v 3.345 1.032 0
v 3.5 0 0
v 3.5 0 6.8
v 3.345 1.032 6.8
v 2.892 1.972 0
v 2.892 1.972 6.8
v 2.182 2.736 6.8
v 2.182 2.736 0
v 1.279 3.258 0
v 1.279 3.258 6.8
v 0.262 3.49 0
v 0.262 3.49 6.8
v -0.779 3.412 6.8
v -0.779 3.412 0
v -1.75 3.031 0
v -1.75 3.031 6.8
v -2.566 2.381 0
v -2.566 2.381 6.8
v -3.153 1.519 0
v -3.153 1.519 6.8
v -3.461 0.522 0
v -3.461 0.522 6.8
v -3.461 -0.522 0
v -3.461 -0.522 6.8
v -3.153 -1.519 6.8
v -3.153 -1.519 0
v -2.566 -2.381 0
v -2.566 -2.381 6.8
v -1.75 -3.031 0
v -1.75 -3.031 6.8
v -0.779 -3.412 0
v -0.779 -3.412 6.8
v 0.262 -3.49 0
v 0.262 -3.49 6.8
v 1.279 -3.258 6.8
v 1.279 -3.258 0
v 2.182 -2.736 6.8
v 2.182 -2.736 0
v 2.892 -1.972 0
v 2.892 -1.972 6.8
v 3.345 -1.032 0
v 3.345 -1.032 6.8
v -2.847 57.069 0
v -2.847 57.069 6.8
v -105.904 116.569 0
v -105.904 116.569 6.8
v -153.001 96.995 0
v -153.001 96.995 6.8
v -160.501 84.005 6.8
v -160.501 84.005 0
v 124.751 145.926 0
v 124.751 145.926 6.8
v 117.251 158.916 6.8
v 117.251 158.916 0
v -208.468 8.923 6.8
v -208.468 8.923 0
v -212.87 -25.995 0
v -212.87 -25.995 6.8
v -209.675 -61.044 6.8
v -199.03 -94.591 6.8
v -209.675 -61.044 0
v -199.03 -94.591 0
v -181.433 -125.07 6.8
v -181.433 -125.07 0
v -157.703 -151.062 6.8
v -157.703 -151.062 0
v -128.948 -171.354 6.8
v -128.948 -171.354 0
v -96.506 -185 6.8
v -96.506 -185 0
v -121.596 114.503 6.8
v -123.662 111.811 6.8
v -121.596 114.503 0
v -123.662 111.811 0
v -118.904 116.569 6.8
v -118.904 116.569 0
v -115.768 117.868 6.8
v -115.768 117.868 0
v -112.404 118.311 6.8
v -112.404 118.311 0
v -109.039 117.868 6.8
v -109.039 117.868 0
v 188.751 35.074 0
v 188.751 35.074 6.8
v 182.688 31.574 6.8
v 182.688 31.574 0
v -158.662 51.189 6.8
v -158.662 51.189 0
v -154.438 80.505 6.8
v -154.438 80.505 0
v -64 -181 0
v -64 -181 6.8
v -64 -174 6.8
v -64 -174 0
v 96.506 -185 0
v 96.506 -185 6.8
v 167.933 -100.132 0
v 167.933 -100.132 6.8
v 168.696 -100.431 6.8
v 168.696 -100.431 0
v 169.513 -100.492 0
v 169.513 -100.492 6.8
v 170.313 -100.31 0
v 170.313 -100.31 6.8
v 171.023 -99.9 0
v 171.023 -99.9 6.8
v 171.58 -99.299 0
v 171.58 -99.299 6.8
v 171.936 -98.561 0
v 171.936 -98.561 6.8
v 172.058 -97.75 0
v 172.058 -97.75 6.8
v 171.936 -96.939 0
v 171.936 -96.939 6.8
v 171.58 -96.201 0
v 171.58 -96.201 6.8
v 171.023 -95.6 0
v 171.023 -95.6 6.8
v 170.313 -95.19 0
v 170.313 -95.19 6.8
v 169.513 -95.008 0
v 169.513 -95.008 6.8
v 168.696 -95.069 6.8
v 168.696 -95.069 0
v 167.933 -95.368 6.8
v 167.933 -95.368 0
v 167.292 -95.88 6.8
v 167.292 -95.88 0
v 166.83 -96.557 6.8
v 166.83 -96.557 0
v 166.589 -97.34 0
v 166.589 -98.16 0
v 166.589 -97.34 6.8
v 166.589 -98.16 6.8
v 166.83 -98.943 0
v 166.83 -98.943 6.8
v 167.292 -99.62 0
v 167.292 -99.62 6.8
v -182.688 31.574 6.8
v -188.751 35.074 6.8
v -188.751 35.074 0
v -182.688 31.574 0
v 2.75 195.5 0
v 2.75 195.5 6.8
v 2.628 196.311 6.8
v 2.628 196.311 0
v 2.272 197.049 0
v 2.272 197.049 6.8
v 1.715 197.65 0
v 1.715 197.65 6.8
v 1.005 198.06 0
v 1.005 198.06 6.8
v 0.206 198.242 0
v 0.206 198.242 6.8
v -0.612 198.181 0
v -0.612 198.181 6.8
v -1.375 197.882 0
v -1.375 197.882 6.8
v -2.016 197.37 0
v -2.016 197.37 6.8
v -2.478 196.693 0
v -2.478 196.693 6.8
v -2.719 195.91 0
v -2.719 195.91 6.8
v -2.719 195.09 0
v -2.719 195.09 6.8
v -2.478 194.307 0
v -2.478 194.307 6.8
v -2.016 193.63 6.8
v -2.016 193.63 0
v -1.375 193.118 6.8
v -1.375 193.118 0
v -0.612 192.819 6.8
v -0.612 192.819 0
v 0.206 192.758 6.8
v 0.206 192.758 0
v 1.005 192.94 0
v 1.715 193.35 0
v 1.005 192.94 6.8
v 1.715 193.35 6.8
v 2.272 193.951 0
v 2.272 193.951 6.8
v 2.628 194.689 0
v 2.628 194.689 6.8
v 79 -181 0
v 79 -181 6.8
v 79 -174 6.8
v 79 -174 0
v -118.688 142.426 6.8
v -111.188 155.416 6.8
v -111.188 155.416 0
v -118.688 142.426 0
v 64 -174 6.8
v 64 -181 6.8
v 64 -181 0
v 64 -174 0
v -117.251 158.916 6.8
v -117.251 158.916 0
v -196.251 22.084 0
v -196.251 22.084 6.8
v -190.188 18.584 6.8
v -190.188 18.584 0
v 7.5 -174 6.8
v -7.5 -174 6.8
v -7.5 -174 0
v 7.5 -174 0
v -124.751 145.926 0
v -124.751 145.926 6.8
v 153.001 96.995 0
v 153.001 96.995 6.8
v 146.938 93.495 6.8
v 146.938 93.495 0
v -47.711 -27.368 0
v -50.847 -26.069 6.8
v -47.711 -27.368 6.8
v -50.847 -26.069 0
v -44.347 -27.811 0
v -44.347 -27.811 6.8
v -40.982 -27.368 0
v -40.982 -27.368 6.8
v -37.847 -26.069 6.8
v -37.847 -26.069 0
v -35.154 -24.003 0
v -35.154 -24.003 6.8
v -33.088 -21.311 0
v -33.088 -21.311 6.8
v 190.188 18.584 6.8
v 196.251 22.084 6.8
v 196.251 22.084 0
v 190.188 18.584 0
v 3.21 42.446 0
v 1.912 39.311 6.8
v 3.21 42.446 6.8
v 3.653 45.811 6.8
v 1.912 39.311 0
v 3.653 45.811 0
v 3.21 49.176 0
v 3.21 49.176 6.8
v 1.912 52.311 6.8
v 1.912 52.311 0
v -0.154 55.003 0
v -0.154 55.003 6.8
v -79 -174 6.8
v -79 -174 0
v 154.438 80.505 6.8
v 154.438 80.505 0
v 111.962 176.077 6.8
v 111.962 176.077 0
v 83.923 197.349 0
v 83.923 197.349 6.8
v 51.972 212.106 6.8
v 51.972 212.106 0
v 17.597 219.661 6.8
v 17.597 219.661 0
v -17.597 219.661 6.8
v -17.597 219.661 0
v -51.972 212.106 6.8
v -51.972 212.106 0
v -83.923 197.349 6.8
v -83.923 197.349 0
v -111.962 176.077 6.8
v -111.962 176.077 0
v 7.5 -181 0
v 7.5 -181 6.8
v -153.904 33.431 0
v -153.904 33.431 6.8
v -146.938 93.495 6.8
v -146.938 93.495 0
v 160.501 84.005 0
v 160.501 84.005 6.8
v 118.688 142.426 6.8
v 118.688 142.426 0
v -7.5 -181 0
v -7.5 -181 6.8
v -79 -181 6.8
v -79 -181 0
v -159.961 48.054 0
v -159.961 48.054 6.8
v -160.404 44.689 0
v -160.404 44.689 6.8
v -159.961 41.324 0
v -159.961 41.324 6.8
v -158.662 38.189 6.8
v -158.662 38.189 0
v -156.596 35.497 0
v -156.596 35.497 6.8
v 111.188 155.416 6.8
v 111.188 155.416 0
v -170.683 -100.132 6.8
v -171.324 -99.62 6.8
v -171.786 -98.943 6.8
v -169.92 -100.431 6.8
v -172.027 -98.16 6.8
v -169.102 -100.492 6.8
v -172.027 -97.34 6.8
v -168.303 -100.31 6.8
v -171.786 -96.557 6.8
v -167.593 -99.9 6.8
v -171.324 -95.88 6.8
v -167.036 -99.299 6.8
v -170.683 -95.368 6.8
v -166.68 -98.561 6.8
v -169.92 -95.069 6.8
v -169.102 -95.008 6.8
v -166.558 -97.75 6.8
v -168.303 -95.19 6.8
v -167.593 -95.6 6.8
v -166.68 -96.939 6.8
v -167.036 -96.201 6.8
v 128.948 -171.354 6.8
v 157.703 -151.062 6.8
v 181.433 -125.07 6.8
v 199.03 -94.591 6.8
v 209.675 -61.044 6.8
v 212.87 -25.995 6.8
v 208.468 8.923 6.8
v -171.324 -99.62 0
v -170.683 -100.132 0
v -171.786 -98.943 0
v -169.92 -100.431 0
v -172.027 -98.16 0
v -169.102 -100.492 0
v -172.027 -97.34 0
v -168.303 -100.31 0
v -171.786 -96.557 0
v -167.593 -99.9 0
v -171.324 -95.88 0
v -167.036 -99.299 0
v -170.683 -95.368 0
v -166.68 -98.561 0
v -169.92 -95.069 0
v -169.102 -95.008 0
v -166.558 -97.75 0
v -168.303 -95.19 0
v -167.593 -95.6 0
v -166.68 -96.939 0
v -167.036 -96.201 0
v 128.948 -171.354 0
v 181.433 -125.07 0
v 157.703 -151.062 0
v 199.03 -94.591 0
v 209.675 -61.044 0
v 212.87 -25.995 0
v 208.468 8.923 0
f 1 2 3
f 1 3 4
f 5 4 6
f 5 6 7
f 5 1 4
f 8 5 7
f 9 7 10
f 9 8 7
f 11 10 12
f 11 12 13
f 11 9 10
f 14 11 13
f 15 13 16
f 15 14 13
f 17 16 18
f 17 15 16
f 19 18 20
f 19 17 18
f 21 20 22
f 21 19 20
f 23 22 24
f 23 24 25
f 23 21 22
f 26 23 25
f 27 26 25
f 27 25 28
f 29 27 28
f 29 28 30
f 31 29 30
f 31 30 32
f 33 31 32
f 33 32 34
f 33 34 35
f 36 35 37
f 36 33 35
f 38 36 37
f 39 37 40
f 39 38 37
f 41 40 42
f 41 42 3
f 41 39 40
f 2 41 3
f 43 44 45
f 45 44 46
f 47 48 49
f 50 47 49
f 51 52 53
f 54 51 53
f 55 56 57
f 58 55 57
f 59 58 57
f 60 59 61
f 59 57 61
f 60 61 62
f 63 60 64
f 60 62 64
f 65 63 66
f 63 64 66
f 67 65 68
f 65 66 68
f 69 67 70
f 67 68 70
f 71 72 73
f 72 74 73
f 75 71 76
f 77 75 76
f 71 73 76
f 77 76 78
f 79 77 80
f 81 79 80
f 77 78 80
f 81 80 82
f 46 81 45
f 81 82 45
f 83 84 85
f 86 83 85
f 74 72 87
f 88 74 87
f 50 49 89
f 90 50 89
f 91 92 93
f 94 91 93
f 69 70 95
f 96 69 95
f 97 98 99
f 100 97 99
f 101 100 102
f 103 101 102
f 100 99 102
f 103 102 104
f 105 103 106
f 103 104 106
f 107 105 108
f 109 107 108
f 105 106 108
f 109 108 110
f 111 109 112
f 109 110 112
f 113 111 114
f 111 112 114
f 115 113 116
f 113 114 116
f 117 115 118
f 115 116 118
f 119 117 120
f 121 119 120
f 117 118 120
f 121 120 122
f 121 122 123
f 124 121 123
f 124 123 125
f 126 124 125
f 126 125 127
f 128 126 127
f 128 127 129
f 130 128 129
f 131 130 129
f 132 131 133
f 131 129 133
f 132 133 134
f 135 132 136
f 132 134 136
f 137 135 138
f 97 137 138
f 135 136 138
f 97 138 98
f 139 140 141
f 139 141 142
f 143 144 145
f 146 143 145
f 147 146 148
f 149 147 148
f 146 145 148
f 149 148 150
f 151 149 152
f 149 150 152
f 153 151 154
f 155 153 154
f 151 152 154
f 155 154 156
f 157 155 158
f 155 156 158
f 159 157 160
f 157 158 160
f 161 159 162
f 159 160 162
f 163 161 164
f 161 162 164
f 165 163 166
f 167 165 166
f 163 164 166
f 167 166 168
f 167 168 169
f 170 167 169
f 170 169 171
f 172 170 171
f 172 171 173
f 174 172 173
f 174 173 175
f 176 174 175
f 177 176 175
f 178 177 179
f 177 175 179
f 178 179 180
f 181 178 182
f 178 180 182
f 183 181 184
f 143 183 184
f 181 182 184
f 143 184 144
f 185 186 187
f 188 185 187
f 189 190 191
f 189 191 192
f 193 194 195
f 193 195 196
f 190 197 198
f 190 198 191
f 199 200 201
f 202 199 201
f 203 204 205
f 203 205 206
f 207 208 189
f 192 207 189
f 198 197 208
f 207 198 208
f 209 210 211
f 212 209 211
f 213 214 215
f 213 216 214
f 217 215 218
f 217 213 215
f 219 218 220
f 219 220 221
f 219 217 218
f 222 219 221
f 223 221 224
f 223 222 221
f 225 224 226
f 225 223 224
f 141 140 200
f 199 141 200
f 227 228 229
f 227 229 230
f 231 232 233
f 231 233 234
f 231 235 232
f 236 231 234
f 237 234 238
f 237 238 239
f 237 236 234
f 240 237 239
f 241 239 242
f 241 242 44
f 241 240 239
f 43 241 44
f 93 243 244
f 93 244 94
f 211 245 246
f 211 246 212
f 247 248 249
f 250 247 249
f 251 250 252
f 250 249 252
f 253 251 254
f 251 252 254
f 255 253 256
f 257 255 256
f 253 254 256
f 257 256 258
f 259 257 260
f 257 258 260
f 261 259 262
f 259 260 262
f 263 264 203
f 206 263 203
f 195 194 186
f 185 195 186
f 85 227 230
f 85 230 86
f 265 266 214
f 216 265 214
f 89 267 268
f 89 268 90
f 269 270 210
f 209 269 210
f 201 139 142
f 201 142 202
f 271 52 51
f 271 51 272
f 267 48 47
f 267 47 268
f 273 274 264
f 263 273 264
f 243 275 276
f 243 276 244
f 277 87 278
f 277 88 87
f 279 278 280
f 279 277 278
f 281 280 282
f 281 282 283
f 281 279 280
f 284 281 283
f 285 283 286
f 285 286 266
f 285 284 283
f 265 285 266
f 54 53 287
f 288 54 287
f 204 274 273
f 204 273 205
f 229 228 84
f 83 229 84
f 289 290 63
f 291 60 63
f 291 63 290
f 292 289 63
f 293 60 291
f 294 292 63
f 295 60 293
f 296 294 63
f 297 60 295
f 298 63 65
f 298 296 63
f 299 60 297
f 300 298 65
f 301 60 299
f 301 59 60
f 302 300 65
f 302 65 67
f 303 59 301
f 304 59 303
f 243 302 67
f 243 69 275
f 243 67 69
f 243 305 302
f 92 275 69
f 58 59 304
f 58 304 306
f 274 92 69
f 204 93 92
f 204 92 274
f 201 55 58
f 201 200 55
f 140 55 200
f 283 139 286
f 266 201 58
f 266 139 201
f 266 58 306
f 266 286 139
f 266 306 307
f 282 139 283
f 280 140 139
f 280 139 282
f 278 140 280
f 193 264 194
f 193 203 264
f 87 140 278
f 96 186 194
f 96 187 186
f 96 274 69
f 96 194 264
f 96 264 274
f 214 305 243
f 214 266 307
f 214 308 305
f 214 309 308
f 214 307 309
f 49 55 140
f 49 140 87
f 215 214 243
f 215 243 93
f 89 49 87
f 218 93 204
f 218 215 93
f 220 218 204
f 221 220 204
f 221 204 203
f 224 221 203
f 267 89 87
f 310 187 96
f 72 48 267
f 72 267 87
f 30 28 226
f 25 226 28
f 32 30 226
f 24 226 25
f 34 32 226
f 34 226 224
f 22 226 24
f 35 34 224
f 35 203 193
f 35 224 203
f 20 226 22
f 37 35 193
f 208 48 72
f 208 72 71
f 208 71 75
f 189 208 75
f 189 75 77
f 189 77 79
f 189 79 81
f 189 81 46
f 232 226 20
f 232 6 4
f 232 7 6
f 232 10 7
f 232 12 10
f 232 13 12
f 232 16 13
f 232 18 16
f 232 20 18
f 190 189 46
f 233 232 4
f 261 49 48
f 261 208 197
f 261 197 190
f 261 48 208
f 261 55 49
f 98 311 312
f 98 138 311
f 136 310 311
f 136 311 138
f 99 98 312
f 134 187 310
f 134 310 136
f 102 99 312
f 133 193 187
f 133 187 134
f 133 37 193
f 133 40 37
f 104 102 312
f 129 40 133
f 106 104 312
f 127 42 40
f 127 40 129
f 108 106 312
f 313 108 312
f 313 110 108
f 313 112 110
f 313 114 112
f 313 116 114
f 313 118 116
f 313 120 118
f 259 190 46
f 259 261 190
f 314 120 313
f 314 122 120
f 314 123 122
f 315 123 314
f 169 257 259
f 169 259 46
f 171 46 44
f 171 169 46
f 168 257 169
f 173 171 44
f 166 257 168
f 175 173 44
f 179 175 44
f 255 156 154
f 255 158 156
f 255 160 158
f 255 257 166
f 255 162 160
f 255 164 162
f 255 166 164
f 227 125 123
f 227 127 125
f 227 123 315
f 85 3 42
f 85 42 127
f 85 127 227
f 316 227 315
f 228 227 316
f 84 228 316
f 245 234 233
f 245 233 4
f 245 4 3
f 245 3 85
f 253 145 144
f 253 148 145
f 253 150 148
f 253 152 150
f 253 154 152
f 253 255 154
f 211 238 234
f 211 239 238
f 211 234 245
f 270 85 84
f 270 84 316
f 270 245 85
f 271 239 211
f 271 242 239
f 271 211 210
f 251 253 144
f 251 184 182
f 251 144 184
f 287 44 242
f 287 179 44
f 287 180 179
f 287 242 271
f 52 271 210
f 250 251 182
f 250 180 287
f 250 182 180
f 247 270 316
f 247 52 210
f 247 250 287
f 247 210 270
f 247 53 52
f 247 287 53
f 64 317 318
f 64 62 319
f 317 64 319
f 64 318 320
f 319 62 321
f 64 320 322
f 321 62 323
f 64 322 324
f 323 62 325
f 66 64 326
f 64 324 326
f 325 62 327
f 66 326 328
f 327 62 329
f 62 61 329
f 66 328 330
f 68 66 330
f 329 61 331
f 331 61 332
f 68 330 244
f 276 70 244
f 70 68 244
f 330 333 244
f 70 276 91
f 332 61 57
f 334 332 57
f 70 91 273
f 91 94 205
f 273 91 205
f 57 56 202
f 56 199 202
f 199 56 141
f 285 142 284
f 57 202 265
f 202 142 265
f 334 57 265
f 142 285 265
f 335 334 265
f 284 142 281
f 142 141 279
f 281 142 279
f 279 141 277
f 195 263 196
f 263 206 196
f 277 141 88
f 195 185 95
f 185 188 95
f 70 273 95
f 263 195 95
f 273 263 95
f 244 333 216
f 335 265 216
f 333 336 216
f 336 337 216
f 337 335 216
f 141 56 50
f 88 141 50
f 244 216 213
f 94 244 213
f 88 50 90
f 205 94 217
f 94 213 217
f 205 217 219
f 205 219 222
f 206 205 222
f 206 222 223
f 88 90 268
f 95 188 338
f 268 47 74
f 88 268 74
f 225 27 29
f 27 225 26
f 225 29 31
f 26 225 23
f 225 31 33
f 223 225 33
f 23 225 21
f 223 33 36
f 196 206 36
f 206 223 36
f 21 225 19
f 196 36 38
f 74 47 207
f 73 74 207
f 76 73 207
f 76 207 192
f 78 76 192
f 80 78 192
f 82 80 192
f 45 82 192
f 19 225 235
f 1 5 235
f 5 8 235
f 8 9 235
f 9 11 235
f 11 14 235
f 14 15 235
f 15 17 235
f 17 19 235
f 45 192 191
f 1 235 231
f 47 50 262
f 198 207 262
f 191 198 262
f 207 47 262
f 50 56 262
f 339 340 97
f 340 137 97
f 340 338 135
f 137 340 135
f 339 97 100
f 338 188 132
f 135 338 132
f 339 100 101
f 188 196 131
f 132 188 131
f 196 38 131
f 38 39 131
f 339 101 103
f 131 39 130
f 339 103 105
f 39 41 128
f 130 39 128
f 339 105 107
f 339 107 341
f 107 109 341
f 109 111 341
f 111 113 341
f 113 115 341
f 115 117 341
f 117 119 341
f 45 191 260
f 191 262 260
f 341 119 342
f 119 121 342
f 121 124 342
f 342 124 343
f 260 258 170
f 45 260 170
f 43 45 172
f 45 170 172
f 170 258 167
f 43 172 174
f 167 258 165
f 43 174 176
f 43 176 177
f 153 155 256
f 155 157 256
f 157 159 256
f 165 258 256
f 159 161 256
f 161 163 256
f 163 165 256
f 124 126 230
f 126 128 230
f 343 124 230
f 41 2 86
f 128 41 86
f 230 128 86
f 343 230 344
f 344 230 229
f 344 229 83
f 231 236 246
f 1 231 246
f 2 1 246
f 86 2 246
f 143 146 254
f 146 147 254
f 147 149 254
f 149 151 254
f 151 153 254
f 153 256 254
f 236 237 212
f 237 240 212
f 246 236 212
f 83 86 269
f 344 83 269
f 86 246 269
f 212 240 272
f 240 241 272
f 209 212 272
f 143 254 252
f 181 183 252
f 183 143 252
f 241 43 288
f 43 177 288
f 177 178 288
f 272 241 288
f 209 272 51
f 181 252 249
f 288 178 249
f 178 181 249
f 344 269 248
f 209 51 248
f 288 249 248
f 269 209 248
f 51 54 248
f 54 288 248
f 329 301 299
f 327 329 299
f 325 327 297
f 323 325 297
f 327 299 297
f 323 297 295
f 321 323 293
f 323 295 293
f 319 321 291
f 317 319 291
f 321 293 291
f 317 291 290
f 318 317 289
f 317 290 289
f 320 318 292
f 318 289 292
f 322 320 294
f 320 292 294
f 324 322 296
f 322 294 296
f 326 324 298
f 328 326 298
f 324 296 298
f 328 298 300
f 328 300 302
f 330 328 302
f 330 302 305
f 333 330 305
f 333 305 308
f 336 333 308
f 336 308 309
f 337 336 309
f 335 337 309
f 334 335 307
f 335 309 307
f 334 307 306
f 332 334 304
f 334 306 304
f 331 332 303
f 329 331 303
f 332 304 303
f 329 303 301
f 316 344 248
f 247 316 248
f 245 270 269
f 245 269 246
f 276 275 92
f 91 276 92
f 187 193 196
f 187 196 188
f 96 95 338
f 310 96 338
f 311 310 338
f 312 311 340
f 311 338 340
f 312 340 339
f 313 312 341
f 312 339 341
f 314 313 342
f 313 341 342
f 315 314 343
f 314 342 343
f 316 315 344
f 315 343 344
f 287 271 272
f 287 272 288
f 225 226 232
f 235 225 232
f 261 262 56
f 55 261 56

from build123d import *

# Parameters (mm, degrees)
SKETCH1_R           = 3.5
BOSS_EXTRUDE1_DEPTH = 6.8
SKETCH2_W           = 15
SKETCH2_H           = 7
CUT_EXTRUDE1_DEPTH  = 6.8
SKETCH3_R           = 2.75
CUT_EXTRUDE2_DEPTH  = 6.8
CIRPATTERN1_COUNT   = 3
CUT_EXTRUDE3_DEPTH  = 6.8
FILLET1_R           = 13


with BuildPart() as part:
    # Sketch1 → Boss-Extrude1 (new body)
    with BuildSketch(Plane.XY):
        with BuildLine():
            Line((-96.50625, -185), (96.50625, -185))
            ThreePointArc((96.50625, -185), (191.056759621, -110.306671598), (208.4678247, 8.923135876))
            Line((208.4678247, 8.923135876), (111.9615747, 176.076864124))
            ThreePointArc((111.9615747, 176.076864124), (0, 220.613343196), (-111.9615747, 176.076864124))
            Line((-111.9615747, 176.076864124), (-208.4678247, 8.923135876))
            ThreePointArc((-208.4678247, 8.923135876), (-191.056759621, -110.306671598), (-96.50625, -185))
        make_face()
        Circle(SKETCH1_R, mode=Mode.SUBTRACT)
    extrude(amount=BOSS_EXTRUDE1_DEPTH)

    # Sketch2 → Cut-Extrude1 (cut)
    with BuildSketch(Plane.XY.offset(6.8)):
        with Locations((0, -177.5)):
            Rectangle(SKETCH2_W, SKETCH2_H)
        with Locations((71.5, -177.5)):
            Rectangle(SKETCH2_W, SKETCH2_H)
        with Locations((-71.5, -177.5)):
            Rectangle(SKETCH2_W, SKETCH2_H)
    cut_extrude1 = extrude(amount=-CUT_EXTRUDE1_DEPTH, mode=Mode.SUBTRACT)

    # Sketch3 → Cut-Extrude2 (cut)
    with BuildSketch(Plane.XY.offset(6.8)):
        with Locations((0, 195.5)):
            Circle(SKETCH3_R)
    cut_extrude2 = extrude(amount=-CUT_EXTRUDE2_DEPTH, mode=Mode.SUBTRACT)

    # CirPattern1: Cut-Extrude1, Cut-Extrude2 ×3 about axis
    cirpattern1_axis = Axis((0, 0, 0), (0, 0, 1))
    for i in range(1, CIRPATTERN1_COUNT):
        add(cut_extrude1.rotate(cirpattern1_axis, i * 360 / CIRPATTERN1_COUNT), mode=Mode.SUBTRACT)
        add(cut_extrude2.rotate(cirpattern1_axis, i * 360 / CIRPATTERN1_COUNT), mode=Mode.SUBTRACT)

    # Sketch4 → Cut-Extrude3 (cut)
    with BuildSketch(Plane.XY.offset(6.8)):
        Polygon((-117.162140817, 123.069219382), (-165.162140817, 39.930780618), (-39.588457268, -32.569219382), (8.411542732, 50.569219382), align=None)
    extrude(amount=-CUT_EXTRUDE3_DEPTH, mode=Mode.SUBTRACT)

    # Fillet1
    fillet1_edges = [part.edges().sort_by_distance(p)[0] for p in [
        (-117.162140817, 123.069219382, 3.4),
        (8.411542732, 50.569219382, 3.4),
        (-39.588457268, -32.569219382, 3.4),
        (-165.162140817, 39.930780618, 3.4),
    ]]
    fillet(fillet1_edges, radius=FILLET1_R)


solid = part.part
